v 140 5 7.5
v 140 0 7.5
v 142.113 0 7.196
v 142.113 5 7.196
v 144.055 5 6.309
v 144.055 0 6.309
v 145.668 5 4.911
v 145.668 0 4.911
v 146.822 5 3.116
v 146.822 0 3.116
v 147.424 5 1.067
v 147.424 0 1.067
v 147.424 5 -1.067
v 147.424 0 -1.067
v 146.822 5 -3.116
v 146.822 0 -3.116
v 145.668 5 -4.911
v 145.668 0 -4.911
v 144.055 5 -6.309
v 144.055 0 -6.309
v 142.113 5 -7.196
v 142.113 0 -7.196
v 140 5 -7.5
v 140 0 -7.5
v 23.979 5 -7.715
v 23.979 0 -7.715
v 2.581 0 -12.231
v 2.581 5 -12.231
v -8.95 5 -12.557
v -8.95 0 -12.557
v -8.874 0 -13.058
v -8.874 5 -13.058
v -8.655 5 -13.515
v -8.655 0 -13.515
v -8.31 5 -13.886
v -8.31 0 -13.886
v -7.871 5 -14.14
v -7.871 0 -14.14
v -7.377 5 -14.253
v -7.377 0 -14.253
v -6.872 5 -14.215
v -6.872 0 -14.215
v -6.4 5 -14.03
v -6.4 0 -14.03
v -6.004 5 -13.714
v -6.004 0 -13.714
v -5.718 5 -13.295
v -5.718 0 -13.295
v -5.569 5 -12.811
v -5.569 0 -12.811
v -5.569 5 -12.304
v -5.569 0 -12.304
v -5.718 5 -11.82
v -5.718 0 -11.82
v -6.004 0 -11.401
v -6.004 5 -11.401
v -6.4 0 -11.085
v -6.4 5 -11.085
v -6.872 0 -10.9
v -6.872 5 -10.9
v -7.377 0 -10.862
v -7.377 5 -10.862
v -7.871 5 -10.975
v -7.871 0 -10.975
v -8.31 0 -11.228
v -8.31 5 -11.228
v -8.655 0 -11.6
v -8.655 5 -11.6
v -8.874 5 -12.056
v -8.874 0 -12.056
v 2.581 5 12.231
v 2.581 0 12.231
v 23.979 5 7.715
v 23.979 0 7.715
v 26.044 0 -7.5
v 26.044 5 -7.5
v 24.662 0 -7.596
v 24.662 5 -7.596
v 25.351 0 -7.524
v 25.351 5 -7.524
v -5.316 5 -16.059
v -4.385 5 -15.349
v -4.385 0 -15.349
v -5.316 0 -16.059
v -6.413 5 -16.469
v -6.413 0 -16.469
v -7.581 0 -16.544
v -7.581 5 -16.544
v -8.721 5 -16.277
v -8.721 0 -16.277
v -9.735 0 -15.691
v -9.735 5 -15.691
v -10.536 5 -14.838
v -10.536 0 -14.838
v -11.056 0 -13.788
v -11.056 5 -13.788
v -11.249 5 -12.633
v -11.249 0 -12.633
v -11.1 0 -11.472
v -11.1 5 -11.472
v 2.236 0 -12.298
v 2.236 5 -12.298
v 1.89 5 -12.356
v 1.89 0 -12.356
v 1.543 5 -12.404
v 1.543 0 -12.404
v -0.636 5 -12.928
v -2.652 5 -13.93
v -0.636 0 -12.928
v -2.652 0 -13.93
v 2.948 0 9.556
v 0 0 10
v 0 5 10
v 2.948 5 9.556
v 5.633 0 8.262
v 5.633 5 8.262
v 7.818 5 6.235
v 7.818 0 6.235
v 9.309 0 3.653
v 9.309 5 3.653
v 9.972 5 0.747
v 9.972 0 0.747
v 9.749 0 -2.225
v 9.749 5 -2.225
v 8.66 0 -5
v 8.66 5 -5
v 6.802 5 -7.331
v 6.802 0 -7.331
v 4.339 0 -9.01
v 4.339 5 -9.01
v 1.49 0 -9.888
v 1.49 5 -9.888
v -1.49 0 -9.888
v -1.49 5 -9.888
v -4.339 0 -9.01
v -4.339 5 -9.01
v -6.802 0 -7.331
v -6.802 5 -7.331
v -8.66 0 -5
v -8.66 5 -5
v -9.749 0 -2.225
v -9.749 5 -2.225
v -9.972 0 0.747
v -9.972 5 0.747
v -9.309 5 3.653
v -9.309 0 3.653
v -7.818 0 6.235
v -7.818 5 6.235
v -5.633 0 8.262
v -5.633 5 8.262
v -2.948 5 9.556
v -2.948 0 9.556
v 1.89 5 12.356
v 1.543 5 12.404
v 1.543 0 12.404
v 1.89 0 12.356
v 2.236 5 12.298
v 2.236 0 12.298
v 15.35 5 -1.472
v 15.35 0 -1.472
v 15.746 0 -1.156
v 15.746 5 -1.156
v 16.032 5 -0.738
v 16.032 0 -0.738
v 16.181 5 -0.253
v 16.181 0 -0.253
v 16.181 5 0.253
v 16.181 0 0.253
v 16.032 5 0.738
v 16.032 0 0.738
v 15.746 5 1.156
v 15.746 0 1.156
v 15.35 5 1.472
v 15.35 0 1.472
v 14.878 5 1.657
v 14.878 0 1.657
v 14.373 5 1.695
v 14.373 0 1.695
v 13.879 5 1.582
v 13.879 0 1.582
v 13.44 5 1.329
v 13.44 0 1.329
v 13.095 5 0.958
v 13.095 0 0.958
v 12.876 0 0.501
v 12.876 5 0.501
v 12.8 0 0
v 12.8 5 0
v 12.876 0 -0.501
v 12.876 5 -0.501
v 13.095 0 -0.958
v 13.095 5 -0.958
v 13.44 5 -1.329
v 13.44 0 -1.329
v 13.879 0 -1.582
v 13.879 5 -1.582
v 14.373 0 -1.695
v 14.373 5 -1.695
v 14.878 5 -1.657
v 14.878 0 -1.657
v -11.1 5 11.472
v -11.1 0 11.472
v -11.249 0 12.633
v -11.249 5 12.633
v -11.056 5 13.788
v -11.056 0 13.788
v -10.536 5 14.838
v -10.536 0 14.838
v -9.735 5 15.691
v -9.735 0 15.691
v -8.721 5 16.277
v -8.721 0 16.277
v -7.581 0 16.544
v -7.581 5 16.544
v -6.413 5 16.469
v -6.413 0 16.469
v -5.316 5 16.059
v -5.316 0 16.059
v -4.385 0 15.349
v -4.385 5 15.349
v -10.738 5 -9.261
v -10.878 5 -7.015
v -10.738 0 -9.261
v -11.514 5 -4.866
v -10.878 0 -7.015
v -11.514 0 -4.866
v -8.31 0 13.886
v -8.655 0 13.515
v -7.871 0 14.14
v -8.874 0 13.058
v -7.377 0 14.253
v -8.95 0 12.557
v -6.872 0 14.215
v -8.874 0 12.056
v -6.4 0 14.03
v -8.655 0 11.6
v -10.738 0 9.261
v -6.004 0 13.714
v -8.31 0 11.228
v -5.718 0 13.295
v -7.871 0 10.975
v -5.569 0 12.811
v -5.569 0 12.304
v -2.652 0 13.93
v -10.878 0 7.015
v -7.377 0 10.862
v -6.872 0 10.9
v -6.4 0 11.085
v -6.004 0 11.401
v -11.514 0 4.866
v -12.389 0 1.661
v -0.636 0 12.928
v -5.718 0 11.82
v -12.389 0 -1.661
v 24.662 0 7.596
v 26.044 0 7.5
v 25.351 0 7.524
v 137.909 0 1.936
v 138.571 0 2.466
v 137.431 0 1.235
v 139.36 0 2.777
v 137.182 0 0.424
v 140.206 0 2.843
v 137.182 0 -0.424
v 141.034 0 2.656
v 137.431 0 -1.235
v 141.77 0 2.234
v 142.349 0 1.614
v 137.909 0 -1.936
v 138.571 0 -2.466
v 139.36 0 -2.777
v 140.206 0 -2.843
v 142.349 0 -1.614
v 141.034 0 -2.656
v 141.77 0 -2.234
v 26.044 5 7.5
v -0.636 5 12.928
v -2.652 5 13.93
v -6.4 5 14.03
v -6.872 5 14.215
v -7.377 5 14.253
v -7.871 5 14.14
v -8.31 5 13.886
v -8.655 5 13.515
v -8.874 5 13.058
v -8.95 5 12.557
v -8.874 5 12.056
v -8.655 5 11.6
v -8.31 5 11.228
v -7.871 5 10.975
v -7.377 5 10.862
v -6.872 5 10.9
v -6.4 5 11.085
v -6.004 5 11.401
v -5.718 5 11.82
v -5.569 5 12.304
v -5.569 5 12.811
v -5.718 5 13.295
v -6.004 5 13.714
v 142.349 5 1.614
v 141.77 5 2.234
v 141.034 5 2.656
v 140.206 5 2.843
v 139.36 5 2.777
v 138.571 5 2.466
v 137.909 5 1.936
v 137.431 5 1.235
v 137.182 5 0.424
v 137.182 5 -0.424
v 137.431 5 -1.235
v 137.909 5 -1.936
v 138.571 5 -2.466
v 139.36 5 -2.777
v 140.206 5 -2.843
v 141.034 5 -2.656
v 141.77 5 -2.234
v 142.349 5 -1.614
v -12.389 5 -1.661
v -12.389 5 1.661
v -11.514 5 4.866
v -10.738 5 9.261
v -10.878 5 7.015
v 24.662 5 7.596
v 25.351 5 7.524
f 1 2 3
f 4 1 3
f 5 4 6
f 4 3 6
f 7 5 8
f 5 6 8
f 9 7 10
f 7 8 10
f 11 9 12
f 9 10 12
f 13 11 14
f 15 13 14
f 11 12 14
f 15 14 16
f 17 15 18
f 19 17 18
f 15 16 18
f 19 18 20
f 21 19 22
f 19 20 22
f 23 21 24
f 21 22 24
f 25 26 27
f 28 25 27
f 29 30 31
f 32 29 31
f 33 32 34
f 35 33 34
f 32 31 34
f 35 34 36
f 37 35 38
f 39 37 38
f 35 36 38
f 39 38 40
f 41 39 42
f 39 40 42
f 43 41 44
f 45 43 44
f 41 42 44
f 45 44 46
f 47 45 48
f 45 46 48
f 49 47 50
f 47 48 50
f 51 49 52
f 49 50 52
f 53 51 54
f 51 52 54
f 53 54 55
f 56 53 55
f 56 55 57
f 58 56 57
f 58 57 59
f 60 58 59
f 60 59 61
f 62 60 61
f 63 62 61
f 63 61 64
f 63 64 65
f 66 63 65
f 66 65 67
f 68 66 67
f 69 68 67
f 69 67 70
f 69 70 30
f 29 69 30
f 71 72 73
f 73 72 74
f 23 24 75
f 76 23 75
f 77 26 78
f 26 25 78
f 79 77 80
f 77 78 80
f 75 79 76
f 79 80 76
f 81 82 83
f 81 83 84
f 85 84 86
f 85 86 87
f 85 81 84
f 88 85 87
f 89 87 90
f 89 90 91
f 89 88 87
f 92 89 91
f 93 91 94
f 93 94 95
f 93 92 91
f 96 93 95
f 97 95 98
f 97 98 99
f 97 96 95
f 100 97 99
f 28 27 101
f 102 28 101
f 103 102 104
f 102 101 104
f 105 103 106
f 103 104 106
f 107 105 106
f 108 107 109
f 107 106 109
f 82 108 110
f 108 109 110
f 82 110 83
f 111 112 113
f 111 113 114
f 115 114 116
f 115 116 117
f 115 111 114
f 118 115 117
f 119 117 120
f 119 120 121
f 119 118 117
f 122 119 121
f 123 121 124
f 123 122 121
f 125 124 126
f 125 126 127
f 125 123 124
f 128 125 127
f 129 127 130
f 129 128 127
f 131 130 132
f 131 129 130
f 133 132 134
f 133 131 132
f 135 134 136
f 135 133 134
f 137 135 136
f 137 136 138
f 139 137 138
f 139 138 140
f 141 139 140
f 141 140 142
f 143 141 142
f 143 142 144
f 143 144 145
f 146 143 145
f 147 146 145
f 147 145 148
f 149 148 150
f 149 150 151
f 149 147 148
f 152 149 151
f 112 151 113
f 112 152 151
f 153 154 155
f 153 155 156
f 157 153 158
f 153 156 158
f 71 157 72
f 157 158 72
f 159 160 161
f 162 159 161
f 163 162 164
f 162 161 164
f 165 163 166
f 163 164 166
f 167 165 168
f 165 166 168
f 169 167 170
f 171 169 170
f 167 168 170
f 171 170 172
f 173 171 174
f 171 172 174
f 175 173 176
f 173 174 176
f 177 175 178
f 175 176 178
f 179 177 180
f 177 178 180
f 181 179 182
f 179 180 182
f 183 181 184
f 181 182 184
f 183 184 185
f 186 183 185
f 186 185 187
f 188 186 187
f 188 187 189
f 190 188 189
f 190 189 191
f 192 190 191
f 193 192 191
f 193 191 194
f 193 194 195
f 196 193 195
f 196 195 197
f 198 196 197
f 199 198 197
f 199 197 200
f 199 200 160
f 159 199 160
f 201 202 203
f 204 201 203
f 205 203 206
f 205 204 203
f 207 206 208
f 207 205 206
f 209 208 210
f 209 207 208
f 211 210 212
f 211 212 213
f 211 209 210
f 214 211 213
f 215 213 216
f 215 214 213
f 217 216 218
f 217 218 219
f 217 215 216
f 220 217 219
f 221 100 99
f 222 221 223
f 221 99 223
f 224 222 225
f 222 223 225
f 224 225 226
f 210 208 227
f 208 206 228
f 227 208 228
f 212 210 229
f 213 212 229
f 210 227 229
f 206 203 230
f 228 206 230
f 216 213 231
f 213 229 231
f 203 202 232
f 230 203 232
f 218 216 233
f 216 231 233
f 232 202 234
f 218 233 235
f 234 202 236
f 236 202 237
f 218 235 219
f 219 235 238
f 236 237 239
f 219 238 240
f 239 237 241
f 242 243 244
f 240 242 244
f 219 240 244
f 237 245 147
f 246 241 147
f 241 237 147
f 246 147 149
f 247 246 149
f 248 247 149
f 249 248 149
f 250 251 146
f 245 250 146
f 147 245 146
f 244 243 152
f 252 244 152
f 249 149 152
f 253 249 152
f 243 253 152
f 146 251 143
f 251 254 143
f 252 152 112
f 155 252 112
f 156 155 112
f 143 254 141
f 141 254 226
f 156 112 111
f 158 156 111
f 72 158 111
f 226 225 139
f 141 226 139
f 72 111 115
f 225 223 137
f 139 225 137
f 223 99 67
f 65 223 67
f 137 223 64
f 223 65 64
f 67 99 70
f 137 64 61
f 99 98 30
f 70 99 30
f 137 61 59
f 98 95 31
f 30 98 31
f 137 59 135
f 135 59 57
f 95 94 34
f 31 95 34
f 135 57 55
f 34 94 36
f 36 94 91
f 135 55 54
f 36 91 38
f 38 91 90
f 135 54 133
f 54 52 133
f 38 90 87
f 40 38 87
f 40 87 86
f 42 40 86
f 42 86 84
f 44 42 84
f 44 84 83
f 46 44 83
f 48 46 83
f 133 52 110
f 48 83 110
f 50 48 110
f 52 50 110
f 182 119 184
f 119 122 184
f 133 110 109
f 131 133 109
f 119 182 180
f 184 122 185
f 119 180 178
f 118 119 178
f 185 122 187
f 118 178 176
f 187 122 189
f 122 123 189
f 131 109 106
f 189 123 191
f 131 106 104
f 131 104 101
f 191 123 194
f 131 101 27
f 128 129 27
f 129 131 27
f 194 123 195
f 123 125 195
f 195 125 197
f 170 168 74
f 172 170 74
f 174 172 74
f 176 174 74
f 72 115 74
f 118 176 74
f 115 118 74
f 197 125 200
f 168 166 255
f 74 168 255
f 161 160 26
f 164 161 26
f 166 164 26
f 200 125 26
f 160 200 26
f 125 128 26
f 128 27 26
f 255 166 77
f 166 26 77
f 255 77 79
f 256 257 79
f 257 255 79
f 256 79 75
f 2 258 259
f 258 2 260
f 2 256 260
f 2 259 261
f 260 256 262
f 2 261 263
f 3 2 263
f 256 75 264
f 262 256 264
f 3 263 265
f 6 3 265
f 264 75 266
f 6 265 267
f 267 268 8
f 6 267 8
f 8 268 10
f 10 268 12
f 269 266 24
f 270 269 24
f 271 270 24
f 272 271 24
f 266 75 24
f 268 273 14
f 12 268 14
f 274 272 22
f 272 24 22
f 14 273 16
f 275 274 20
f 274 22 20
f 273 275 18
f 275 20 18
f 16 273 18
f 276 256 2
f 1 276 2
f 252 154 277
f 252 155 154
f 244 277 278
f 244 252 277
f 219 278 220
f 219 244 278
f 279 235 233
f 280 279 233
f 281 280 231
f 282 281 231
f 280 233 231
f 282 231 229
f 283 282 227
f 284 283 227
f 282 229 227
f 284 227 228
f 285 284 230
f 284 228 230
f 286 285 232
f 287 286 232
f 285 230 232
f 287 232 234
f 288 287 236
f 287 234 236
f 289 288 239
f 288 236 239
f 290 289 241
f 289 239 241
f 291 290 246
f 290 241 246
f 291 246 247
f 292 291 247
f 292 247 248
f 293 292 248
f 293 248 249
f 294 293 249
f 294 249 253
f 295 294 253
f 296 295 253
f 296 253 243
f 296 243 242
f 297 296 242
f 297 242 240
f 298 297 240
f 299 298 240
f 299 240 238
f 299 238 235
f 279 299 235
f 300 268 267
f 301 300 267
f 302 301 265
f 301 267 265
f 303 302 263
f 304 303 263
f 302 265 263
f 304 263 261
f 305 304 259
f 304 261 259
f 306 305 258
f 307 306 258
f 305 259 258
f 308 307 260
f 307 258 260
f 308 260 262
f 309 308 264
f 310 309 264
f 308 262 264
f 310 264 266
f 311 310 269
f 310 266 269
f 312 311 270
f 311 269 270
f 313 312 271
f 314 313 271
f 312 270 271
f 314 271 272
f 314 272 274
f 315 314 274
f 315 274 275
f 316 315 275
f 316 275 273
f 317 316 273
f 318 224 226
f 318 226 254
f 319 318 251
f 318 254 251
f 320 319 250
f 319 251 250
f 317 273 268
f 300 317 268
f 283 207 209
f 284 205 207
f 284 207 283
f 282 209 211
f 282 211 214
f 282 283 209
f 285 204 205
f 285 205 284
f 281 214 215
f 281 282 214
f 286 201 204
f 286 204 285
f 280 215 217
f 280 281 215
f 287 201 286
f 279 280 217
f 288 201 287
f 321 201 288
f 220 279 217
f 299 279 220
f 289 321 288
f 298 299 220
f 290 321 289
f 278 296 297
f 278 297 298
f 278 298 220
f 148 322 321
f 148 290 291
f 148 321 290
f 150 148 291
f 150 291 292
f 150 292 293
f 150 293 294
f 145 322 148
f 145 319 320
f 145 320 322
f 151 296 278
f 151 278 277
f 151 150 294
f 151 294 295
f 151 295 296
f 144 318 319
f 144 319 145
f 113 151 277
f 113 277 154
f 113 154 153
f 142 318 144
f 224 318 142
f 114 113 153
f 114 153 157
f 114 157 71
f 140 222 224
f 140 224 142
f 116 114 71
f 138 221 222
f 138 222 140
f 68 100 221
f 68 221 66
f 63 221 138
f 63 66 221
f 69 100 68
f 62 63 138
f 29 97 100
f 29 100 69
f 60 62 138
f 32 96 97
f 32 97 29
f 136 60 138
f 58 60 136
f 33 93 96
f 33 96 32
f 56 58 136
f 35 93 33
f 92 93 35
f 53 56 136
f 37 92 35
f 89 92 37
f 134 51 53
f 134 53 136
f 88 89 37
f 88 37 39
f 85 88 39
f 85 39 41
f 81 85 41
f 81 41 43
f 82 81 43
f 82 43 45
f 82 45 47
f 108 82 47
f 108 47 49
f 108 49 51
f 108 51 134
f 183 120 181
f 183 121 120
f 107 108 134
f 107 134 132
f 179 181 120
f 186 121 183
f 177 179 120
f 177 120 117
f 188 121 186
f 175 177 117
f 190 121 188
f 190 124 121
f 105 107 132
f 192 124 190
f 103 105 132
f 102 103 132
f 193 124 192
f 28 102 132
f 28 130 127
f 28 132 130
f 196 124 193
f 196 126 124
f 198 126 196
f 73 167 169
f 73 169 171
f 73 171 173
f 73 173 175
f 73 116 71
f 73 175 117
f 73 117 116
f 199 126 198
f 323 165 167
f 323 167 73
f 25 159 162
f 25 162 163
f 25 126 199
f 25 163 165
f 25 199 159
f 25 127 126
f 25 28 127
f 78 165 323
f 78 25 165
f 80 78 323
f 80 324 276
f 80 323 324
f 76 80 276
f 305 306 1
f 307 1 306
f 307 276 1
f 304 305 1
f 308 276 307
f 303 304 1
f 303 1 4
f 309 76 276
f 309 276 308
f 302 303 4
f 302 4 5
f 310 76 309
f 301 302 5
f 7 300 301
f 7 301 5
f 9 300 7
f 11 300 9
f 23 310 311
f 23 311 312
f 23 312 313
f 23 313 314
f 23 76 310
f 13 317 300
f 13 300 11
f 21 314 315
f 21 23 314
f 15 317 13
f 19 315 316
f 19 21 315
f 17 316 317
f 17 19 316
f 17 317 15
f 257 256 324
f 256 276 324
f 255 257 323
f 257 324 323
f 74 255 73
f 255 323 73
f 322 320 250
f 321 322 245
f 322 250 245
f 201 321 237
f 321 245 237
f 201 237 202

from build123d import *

# Parameters (mm, degrees)
SKETCH1_R            = 10
BOSS_EXTRUDE1_DEPTH  = 5
BOSS_EXTRUDE3_DEPTH  = 5
M3_CLEARANCE_HOLE1_D = 3.4
CIRPATTERN1_COUNT    = 3
FILLET1_R            = 10


with BuildPart() as part:
    # Sketch1 → Boss-Extrude1 (new body)
    with BuildSketch(Plane(origin=(0, 0, 0), x_dir=(1, 0, 0), z_dir=(0, 1, 0))):
        with BuildLine():
            Line((25, 7.5), (2.58079654, 12.230678199))
            ThreePointArc((2.58079654, 12.230678199), (-12.5, 0), (2.58079654, -12.230678199))
            Line((2.58079654, -12.230678199), (25, -7.5))
            Line((25, -7.5), (140, -7.5))
            ThreePointArc((140, -7.5), (147.5, 0), (140, 7.5))
            Line((140, 7.5), (25, 7.5))
        make_face()
        with Locations(Location((0, 0, 0), (0, 0, 270))):
            Circle(SKETCH1_R, mode=Mode.SUBTRACT)
        with BuildLine():
            ThreePointArc((142.348879749, -1.614082998), (137.15, 0), (142.348879749, 1.614082998))
            Line((142.348879749, 1.614082998), (142.348879749, -1.614082998))
        make_face(mode=Mode.SUBTRACT)
    extrude(amount=BOSS_EXTRUDE1_DEPTH)

    # Sketch2 → Boss-Extrude3 (add)
    with BuildSketch(Plane(origin=(0, 5, 0), x_dir=(1, 0, 0), z_dir=(0, 1, 0))):
        with BuildLine():
            ThreePointArc((-6.25, 10.825317547), (-4.412013956, 11.695474888), (-2.457258026, 12.256095748))
            Line((-2.457258026, 12.256095748), (-3.785898385, 14.557368355))
            ThreePointArc((-3.785898385, 14.557368355), (-9.25, 16.02146997), (-10.714101615, 10.557368355))
            Line((-10.714101615, 10.557368355), (-9.385461256, 8.256095748))
            ThreePointArc((-9.385461256, 8.256095748), (-7.922571384, 9.668653612), (-6.25, 10.825317547))
        make_face()
    boss_extrude3 = extrude(amount=-BOSS_EXTRUDE3_DEPTH)

    # M3 Clearance Hole1 (through all)
    with Locations(Plane(origin=(0, 5, 0), x_dir=(1, 0, 0), z_dir=(0, 1, 0))):
        with Locations((-7.25, 12.557368355)):
            m3_clearance_hole1 = Hole(M3_CLEARANCE_HOLE1_D / 2)

    # CirPattern1: Boss-Extrude3, M3 Clearance Hole1 ×3 about axis
    cirpattern1_axis = Axis((0, 0, 0), (0, 1, 0))
    add([boss_extrude3.rotate(cirpattern1_axis, i * 360 / CIRPATTERN1_COUNT) for i in range(1, CIRPATTERN1_COUNT)])
    add([m3_clearance_hole1.rotate(cirpattern1_axis, i * 360 / CIRPATTERN1_COUNT) for i in range(1, CIRPATTERN1_COUNT)], mode=Mode.SUBTRACT)

    # Fillet1
    fillet1_edges = [part.edges().sort_by_distance(p)[0] for p in [
        (-2.457258026, 2.5, 12.256095748),
        (-9.385461256, 2.5, 8.256095748),
        (-9.385461256, 2.5, -8.256095748),
        (-2.457258026, 2.5, -12.256095748),
        (25, 2.5, 7.5),
        (25, 2.5, -7.5),
    ]]
    fillet(fillet1_edges, radius=FILLET1_R)


solid = part.part
